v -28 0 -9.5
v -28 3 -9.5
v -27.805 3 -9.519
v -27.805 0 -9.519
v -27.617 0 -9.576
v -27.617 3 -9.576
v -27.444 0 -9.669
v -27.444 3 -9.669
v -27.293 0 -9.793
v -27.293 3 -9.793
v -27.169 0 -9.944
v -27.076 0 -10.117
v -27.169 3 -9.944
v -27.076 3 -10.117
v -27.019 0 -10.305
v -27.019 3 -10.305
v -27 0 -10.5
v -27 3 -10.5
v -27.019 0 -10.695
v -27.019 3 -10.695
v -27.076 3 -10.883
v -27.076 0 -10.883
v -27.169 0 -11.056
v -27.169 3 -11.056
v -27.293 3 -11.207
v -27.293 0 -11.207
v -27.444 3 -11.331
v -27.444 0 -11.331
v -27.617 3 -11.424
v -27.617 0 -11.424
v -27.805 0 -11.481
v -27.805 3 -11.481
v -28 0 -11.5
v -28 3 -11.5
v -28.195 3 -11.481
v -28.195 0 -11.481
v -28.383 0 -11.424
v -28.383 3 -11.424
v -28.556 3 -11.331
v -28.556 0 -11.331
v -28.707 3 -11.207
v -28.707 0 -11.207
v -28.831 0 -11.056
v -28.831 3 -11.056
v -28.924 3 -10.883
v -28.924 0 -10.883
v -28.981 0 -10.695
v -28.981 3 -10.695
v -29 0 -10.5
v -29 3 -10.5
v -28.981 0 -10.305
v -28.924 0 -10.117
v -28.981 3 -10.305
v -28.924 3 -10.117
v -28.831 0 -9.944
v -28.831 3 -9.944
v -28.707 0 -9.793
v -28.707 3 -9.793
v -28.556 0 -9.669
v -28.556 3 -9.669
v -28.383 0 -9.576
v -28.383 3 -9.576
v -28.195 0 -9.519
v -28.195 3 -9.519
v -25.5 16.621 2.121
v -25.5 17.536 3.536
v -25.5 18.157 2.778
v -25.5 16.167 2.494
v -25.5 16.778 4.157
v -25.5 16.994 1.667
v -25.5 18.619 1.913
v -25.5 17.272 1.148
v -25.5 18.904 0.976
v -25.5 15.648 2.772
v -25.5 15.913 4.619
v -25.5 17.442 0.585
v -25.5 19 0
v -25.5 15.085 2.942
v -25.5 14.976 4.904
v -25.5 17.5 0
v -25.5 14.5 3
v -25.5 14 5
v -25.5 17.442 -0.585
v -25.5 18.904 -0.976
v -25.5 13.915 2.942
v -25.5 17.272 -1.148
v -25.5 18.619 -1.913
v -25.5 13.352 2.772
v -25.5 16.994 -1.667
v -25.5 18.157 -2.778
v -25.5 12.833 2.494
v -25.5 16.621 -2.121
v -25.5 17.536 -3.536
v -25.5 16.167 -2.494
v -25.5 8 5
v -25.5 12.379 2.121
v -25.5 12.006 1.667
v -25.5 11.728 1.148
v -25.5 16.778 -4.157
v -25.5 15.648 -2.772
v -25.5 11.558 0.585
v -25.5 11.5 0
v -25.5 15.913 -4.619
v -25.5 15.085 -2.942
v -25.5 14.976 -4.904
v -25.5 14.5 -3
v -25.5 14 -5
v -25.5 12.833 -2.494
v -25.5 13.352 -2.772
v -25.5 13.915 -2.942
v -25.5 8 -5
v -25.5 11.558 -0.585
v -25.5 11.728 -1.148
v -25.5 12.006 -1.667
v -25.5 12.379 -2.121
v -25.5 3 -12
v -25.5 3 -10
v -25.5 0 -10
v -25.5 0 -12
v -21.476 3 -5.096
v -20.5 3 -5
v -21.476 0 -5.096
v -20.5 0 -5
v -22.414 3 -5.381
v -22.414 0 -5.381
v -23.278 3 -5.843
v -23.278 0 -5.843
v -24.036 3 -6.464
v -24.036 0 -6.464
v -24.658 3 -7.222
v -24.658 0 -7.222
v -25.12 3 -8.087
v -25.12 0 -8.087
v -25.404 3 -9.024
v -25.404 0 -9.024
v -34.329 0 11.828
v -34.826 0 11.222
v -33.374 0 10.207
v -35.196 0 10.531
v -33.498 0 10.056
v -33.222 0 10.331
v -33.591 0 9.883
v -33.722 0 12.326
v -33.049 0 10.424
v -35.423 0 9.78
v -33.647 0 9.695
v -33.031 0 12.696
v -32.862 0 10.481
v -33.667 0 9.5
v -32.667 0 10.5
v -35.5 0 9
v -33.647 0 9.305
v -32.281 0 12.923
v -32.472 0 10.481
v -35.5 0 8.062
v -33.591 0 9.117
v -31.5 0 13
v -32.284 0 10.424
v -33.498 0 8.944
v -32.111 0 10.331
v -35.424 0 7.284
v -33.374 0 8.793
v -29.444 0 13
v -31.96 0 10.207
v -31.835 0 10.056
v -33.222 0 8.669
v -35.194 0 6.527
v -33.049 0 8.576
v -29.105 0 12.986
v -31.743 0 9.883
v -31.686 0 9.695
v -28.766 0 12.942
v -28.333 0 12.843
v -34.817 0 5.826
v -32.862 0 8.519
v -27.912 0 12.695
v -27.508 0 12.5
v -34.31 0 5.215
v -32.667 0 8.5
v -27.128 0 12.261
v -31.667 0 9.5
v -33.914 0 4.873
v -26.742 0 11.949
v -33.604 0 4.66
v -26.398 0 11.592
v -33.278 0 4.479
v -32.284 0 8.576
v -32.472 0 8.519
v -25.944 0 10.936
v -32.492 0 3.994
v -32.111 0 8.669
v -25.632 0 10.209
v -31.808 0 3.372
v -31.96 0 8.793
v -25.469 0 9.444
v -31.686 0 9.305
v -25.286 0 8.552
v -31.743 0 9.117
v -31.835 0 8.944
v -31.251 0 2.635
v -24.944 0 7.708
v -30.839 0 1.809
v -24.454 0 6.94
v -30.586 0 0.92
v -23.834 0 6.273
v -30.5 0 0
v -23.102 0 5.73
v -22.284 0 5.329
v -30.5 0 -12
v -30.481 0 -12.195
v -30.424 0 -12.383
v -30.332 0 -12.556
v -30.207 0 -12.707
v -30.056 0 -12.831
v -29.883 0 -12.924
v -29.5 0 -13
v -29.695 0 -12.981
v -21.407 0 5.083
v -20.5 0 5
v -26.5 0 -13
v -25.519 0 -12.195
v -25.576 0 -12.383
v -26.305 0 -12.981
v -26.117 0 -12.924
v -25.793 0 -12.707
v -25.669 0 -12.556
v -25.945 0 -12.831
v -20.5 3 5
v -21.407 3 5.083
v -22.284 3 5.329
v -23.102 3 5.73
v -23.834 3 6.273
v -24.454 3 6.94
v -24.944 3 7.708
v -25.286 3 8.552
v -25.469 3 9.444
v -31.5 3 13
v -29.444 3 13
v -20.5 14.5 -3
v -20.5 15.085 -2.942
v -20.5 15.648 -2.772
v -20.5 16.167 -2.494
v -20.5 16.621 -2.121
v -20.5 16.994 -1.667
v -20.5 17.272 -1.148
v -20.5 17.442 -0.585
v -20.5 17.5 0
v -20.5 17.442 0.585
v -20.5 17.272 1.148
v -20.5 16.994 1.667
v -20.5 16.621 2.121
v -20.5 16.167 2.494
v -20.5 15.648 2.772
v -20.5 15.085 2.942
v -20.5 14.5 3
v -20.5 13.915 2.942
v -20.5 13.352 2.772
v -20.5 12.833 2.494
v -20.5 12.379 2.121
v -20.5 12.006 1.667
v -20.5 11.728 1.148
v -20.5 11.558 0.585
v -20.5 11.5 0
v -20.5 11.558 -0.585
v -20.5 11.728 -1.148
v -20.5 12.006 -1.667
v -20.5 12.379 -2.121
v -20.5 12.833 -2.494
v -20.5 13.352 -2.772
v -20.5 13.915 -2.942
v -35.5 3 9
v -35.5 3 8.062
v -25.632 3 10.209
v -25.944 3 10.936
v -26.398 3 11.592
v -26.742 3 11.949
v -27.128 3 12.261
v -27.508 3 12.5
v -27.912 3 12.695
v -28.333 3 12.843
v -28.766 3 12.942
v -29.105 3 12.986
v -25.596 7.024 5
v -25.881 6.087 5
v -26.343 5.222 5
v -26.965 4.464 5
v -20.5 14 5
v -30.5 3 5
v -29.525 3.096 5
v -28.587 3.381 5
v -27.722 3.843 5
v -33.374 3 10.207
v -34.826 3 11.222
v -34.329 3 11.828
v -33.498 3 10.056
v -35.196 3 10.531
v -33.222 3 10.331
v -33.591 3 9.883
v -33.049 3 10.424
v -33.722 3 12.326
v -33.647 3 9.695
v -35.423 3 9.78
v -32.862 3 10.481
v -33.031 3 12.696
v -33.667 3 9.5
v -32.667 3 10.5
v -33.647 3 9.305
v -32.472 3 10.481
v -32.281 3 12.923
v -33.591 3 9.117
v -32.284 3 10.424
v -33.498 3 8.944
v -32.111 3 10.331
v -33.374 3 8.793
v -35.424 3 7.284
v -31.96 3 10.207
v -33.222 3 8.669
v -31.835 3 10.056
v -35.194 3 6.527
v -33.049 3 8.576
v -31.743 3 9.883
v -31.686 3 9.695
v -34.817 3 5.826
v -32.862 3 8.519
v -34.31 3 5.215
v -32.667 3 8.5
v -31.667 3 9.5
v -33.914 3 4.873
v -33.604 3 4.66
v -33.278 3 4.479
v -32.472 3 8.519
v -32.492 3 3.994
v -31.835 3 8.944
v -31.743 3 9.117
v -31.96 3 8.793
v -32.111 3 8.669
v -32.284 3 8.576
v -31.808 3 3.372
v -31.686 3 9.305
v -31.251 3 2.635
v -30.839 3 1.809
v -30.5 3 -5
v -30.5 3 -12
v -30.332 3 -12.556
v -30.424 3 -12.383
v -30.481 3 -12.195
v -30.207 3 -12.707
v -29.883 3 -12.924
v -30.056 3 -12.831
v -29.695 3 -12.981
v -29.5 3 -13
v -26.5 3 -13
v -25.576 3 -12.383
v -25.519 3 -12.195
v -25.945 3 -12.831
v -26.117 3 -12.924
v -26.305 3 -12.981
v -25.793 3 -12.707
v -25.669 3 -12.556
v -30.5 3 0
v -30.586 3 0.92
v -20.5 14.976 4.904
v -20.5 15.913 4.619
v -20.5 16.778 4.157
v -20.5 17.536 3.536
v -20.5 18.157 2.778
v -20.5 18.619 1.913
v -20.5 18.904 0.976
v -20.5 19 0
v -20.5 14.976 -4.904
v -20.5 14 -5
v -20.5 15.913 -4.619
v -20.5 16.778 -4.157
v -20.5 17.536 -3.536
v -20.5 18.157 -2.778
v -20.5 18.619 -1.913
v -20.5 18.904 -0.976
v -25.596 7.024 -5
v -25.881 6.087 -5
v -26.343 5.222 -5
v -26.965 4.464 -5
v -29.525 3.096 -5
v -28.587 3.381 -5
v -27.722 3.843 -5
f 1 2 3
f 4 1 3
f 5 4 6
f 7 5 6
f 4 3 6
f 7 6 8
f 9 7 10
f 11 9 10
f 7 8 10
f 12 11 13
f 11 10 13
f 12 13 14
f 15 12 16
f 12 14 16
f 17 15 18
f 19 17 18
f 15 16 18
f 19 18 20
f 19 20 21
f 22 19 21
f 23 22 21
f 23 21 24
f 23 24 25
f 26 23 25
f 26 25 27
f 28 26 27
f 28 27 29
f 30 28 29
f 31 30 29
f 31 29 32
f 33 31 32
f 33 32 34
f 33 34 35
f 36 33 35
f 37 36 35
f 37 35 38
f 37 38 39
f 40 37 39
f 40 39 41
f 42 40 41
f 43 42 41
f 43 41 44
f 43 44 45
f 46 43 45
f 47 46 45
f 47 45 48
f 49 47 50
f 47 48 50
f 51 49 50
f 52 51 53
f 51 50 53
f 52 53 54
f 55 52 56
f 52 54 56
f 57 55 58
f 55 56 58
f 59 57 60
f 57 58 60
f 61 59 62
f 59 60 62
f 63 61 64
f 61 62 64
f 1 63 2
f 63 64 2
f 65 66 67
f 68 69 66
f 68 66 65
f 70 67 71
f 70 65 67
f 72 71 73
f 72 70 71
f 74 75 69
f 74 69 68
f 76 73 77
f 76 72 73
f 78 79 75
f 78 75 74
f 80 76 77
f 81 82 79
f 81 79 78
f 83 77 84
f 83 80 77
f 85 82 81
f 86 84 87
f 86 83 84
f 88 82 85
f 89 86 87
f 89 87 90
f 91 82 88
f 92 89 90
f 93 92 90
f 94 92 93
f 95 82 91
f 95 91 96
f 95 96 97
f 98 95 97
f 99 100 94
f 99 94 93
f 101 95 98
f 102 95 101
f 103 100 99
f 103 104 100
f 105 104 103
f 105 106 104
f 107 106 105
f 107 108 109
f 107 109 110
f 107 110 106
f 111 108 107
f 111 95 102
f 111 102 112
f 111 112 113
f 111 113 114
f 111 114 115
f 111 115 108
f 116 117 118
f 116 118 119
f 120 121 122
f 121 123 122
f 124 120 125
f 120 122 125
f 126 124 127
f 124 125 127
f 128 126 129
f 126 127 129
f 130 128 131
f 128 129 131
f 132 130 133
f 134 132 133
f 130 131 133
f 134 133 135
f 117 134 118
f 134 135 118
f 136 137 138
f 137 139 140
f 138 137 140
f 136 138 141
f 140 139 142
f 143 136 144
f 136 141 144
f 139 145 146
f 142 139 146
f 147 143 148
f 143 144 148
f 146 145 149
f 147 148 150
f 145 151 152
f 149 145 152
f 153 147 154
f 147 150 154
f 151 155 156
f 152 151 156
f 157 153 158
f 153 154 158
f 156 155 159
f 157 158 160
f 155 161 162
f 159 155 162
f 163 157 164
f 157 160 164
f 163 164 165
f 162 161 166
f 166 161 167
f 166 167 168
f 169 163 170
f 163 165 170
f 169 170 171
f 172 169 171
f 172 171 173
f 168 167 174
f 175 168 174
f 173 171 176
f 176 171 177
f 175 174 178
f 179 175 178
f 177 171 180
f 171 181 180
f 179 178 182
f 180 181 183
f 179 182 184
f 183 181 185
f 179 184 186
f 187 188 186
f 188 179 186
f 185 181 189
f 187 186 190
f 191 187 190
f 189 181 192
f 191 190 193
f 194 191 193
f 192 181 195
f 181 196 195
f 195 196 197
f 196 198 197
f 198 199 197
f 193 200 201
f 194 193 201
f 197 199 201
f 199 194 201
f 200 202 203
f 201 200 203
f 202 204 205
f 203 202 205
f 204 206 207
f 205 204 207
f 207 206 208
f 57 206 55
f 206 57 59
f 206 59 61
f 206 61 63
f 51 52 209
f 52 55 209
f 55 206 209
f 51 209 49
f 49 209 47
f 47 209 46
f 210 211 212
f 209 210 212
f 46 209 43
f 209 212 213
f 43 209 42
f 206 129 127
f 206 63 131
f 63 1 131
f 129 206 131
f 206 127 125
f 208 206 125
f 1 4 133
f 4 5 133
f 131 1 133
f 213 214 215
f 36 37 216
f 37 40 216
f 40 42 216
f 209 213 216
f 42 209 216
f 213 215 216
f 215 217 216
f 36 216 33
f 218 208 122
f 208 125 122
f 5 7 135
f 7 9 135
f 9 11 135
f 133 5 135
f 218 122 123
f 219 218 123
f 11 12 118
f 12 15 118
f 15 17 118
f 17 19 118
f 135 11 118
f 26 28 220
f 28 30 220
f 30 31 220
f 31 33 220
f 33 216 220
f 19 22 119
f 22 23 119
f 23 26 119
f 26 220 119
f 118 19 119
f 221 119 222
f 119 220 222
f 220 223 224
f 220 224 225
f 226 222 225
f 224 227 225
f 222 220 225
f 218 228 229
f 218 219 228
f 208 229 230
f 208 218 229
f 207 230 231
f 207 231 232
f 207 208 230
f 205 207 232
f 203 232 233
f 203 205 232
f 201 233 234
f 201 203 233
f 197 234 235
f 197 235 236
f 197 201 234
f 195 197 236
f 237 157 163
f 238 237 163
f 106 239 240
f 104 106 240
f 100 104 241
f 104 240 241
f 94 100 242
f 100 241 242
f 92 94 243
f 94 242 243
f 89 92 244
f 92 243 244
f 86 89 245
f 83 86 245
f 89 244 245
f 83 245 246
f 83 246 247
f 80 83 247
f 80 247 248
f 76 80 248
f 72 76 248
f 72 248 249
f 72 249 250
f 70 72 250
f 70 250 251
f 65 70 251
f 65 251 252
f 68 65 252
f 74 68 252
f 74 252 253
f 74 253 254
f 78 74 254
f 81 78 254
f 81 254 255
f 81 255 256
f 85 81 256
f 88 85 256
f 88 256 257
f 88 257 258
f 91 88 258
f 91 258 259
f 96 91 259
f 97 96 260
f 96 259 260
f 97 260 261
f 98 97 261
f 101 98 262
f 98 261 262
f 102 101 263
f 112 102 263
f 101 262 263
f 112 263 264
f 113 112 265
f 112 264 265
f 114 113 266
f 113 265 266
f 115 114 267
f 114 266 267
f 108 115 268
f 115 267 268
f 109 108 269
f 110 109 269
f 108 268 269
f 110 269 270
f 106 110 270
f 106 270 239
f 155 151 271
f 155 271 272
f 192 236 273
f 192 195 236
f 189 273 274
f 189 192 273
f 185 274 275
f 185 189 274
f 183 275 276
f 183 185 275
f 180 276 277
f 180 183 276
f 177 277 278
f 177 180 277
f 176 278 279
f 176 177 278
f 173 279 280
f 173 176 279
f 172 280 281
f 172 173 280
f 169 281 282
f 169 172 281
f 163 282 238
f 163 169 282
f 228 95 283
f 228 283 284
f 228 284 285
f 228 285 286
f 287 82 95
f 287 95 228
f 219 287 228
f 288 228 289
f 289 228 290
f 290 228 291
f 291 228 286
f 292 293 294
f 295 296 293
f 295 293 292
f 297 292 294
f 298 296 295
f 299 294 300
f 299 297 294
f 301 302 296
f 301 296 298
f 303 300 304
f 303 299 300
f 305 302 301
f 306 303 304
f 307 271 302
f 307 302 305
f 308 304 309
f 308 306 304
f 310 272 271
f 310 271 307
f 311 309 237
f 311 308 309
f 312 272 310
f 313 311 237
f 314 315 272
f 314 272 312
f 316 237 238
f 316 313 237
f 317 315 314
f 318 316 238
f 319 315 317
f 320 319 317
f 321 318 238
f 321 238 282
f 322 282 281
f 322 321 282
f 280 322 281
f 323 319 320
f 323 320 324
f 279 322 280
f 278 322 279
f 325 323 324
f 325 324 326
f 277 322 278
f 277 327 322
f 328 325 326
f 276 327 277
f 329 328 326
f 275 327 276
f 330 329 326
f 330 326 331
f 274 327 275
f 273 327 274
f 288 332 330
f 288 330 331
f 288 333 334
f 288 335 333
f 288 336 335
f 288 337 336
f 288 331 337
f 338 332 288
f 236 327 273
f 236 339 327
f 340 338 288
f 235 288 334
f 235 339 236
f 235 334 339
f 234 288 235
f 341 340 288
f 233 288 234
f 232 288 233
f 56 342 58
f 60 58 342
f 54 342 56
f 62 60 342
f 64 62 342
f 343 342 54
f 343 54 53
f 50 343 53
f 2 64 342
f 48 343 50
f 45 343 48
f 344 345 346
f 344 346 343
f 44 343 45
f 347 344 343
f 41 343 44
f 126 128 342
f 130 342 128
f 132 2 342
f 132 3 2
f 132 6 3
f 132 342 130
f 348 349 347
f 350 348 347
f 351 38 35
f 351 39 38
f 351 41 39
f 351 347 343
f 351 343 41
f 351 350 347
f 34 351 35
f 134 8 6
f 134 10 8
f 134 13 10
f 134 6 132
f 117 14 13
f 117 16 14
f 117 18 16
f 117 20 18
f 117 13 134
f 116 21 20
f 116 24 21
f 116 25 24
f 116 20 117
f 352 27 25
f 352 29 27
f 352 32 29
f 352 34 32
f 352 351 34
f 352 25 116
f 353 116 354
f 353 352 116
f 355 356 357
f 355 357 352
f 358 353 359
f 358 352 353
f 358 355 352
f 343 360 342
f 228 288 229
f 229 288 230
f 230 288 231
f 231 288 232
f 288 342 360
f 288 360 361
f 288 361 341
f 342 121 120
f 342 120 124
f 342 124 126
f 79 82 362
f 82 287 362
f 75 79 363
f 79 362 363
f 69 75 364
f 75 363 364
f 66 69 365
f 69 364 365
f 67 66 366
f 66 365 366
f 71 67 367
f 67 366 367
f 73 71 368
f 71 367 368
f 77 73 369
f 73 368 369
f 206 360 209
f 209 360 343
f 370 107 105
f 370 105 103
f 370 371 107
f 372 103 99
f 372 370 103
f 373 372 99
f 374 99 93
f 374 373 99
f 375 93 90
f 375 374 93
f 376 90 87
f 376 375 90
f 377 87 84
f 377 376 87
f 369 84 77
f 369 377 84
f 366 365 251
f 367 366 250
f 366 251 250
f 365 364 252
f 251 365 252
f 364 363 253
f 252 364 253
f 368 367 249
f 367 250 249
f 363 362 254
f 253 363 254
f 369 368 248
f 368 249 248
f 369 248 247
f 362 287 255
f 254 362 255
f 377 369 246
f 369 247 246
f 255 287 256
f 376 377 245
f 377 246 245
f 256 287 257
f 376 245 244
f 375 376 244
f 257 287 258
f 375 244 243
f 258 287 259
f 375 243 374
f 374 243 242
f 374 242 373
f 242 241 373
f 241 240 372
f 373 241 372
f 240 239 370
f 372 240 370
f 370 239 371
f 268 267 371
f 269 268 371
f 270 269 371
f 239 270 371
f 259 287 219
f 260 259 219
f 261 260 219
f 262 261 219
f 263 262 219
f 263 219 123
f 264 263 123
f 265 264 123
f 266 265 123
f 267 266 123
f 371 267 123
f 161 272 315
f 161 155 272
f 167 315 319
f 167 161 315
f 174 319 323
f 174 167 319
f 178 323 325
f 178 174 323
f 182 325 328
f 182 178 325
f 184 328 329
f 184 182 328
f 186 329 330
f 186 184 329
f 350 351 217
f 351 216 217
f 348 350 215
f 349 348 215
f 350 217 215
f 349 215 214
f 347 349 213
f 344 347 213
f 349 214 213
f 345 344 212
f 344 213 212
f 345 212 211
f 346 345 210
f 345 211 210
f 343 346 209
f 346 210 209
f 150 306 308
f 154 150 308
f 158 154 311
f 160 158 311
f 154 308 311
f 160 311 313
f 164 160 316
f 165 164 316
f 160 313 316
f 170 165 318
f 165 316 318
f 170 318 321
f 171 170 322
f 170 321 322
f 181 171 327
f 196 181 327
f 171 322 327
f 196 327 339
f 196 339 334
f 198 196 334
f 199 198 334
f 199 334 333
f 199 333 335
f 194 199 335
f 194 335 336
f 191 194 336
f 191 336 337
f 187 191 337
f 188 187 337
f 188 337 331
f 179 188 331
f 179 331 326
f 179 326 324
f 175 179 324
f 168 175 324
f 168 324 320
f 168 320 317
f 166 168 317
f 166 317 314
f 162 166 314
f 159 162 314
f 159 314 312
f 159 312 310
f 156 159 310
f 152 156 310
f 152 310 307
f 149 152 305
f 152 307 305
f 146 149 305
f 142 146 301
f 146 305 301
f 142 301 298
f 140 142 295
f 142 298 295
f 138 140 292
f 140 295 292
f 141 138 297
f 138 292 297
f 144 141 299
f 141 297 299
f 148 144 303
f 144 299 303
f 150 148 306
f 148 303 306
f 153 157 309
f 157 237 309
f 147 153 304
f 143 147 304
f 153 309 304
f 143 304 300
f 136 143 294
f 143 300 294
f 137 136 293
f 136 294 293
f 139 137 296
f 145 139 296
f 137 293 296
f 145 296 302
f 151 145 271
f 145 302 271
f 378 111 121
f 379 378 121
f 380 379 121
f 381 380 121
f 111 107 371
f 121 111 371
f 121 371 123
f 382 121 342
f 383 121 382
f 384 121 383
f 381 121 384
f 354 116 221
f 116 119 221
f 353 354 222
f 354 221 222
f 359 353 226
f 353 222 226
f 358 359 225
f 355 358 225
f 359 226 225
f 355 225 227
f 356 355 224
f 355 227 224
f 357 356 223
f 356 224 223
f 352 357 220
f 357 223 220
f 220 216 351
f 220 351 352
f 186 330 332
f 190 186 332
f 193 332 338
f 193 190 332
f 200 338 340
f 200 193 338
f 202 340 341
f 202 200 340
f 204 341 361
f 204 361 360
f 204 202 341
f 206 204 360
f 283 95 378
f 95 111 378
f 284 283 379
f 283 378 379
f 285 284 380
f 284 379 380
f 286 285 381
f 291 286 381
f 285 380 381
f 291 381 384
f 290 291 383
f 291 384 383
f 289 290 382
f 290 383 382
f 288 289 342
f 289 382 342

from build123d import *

# Parameters (mm, degrees)
SKETCH1_W           = 15
SKETCH1_H           = 26
BOSS_EXTRUDE1_DEPTH = 3
CUT_EXTRUDE1_REACH  = 39.924
SKETCH2_R           = 1
SKETCH3_W           = 5
SKETCH3_H           = 10
BOSS_EXTRUDE2_DEPTH = 16
CUT_EXTRUDE2_REACH  = 29.477
SKETCH4_R           = 3
CUT_EXTRUDE3_REACH  = 43.052
SKETCH5_W           = 5
SKETCH5_H           = 8
SKETCH5_H_2         = 18
FILLET1_R           = 5
FILLET2_R           = 5
FILLET3_R           = 5
FILLET4_R           = 4
FILLET5_R           = 1


with BuildPart() as part:
    # Sketch1 → Boss-Extrude1 (new body)
    with BuildSketch(Plane(origin=(0, 0, 0), x_dir=(1, 0, 0), z_dir=(0, 1, 0))):
        with Locations((-28.000171023, 0)):
            Rectangle(SKETCH1_W, SKETCH1_H)
    extrude(amount=BOSS_EXTRUDE1_DEPTH)

    # Sketch2 → Cut-Extrude1 (cut, up to next)
    with BuildSketch(Plane(origin=(0, 3, 0), x_dir=(1, 0, 0), z_dir=(0, 1, 0)), mode=Mode.PRIVATE) as cut_extrude1_sk1:
        with Locations(Location((-32.666666667, -9.5, 0), (0, 0, 270))):
            Circle(SKETCH2_R)
    cut_extrude1_tool1 = extrude(cut_extrude1_sk1.sketch, amount=-CUT_EXTRUDE1_REACH, mode=Mode.PRIVATE) & part.part
    # Sketch2 → Cut-Extrude1 (cut, up to next)
    with BuildSketch(Plane(origin=(0, 3, 0), x_dir=(1, 0, 0), z_dir=(0, 1, 0)), mode=Mode.PRIVATE) as cut_extrude1_sk2:
        with Locations(Location((-28, 10.5, 0), (0, 0, 270))):
            Circle(SKETCH2_R)
    cut_extrude1_tool2 = extrude(cut_extrude1_sk2.sketch, amount=-CUT_EXTRUDE1_REACH, mode=Mode.PRIVATE) & part.part
    add(cut_extrude1_tool1.solids().sort_by_distance((-32.666667, 3, 9.5))[0], mode=Mode.SUBTRACT)
    add(cut_extrude1_tool2.solids().sort_by_distance((-28, 3, -10.5))[0], mode=Mode.SUBTRACT)

    # Sketch3 → Boss-Extrude2 (add)
    with BuildSketch(Plane(origin=(0, 3, 0), x_dir=(1, 0, 0), z_dir=(0, 1, 0))):
        with Locations((-23.000171023, 0)):
            Rectangle(SKETCH3_W, SKETCH3_H)
    extrude(amount=BOSS_EXTRUDE2_DEPTH)

    # Sketch4 → Cut-Extrude2 (cut, up to next)
    with BuildSketch(Plane(origin=(-20.500171023, 0, 0), x_dir=(0, 0, -1), z_dir=(1, 0, 0)), mode=Mode.PRIVATE) as cut_extrude2_sk1:
        with Locations((0, 14.5)):
            Circle(SKETCH4_R)
    cut_extrude2_tool1 = extrude(cut_extrude2_sk1.sketch, amount=-CUT_EXTRUDE2_REACH, mode=Mode.PRIVATE) & part.part
    add(cut_extrude2_tool1.solids().sort_by_distance((-20.500171, 14.5, 0))[0], mode=Mode.SUBTRACT)

    # Sketch5 → Cut-Extrude3 (cut, up to next)
    with BuildSketch(Plane(origin=(0, 3, 0), x_dir=(1, 0, 0), z_dir=(0, 1, 0)), mode=Mode.PRIVATE) as cut_extrude3_sk1:
        with Locations((-23.000171023, 9)):
            Rectangle(SKETCH5_W, SKETCH5_H)
    cut_extrude3_tool1 = extrude(cut_extrude3_sk1.sketch, amount=-CUT_EXTRUDE3_REACH, mode=Mode.PRIVATE) & part.part
    # Sketch5 → Cut-Extrude3 (cut, up to next)
    with BuildSketch(Plane(origin=(0, 3, 0), x_dir=(1, 0, 0), z_dir=(0, 1, 0)), mode=Mode.PRIVATE) as cut_extrude3_sk2:
        with Locations((-33.000171023, 4)):
            Rectangle(SKETCH5_W, SKETCH5_H_2)
    cut_extrude3_tool2 = extrude(cut_extrude3_sk2.sketch, amount=-CUT_EXTRUDE3_REACH, mode=Mode.PRIVATE) & part.part
    # Sketch5 → Cut-Extrude3 (cut, up to next)
    with BuildSketch(Plane(origin=(0, 3, 0), x_dir=(1, 0, 0), z_dir=(0, 1, 0)), mode=Mode.PRIVATE) as cut_extrude3_sk3:
        with Locations((-23.000171023, -9)):
            Rectangle(SKETCH5_W, SKETCH5_H)
    cut_extrude3_tool3 = extrude(cut_extrude3_sk3.sketch, amount=-CUT_EXTRUDE3_REACH, mode=Mode.PRIVATE) & part.part
    add(cut_extrude3_tool1.solids().sort_by_distance((-23.000171, 3, -9))[0], mode=Mode.SUBTRACT)
    add(cut_extrude3_tool2.solids().sort_by_distance((-33.000171, 3, -4))[0], mode=Mode.SUBTRACT)
    add(cut_extrude3_tool3.solids().sort_by_distance((-23.000171, 3, 9))[0], mode=Mode.SUBTRACT)

    # Fillet1
    fillet1_edges = [part.edges().sort_by_distance(p)[0] for p in [
        (-23.000171023, 19, -5),
        (-23.000171023, 19, 5),
    ]]
    fillet(fillet1_edges, radius=FILLET1_R - 0.0001)  # a hair under: the kernel refuses the full size

    # Fillet2
    fillet2_edges = [part.edges().sort_by_distance(p)[0] for p in [
        (-25.500171023, 3, 0),
    ]]
    fillet(fillet2_edges, radius=FILLET2_R - 0.0001)  # a hair under: the kernel refuses the full size

    # Fillet3
    fillet3_edges = [part.edges().sort_by_distance(p)[0] for p in [
        (-30.500171023, 1.5, 5),
        (-25.500171023, 1.5, -5),
        (-25.500171023, 1.5, 5),
    ]]
    fillet(fillet3_edges, radius=FILLET3_R - 0.0001)  # a hair under: the kernel refuses the full size

    # Fillet4
    fillet4_edges = [part.edges().sort_by_distance(p)[0] for p in [
        (-35.500171023, 1.5, 5),
        (-35.500171023, 1.5, 13),
        (-25.500171023, 1.5, 13),
    ]]
    fillet(fillet4_edges, radius=FILLET4_R)

    # Fillet5
    fillet5_edges = [part.edges().sort_by_distance(p)[0] for p in [
        (-30.500171023, 1.5, -13),
        (-25.500171023, 1.5, -13),
    ]]
    fillet(fillet5_edges, radius=FILLET5_R)


solid = part.part
